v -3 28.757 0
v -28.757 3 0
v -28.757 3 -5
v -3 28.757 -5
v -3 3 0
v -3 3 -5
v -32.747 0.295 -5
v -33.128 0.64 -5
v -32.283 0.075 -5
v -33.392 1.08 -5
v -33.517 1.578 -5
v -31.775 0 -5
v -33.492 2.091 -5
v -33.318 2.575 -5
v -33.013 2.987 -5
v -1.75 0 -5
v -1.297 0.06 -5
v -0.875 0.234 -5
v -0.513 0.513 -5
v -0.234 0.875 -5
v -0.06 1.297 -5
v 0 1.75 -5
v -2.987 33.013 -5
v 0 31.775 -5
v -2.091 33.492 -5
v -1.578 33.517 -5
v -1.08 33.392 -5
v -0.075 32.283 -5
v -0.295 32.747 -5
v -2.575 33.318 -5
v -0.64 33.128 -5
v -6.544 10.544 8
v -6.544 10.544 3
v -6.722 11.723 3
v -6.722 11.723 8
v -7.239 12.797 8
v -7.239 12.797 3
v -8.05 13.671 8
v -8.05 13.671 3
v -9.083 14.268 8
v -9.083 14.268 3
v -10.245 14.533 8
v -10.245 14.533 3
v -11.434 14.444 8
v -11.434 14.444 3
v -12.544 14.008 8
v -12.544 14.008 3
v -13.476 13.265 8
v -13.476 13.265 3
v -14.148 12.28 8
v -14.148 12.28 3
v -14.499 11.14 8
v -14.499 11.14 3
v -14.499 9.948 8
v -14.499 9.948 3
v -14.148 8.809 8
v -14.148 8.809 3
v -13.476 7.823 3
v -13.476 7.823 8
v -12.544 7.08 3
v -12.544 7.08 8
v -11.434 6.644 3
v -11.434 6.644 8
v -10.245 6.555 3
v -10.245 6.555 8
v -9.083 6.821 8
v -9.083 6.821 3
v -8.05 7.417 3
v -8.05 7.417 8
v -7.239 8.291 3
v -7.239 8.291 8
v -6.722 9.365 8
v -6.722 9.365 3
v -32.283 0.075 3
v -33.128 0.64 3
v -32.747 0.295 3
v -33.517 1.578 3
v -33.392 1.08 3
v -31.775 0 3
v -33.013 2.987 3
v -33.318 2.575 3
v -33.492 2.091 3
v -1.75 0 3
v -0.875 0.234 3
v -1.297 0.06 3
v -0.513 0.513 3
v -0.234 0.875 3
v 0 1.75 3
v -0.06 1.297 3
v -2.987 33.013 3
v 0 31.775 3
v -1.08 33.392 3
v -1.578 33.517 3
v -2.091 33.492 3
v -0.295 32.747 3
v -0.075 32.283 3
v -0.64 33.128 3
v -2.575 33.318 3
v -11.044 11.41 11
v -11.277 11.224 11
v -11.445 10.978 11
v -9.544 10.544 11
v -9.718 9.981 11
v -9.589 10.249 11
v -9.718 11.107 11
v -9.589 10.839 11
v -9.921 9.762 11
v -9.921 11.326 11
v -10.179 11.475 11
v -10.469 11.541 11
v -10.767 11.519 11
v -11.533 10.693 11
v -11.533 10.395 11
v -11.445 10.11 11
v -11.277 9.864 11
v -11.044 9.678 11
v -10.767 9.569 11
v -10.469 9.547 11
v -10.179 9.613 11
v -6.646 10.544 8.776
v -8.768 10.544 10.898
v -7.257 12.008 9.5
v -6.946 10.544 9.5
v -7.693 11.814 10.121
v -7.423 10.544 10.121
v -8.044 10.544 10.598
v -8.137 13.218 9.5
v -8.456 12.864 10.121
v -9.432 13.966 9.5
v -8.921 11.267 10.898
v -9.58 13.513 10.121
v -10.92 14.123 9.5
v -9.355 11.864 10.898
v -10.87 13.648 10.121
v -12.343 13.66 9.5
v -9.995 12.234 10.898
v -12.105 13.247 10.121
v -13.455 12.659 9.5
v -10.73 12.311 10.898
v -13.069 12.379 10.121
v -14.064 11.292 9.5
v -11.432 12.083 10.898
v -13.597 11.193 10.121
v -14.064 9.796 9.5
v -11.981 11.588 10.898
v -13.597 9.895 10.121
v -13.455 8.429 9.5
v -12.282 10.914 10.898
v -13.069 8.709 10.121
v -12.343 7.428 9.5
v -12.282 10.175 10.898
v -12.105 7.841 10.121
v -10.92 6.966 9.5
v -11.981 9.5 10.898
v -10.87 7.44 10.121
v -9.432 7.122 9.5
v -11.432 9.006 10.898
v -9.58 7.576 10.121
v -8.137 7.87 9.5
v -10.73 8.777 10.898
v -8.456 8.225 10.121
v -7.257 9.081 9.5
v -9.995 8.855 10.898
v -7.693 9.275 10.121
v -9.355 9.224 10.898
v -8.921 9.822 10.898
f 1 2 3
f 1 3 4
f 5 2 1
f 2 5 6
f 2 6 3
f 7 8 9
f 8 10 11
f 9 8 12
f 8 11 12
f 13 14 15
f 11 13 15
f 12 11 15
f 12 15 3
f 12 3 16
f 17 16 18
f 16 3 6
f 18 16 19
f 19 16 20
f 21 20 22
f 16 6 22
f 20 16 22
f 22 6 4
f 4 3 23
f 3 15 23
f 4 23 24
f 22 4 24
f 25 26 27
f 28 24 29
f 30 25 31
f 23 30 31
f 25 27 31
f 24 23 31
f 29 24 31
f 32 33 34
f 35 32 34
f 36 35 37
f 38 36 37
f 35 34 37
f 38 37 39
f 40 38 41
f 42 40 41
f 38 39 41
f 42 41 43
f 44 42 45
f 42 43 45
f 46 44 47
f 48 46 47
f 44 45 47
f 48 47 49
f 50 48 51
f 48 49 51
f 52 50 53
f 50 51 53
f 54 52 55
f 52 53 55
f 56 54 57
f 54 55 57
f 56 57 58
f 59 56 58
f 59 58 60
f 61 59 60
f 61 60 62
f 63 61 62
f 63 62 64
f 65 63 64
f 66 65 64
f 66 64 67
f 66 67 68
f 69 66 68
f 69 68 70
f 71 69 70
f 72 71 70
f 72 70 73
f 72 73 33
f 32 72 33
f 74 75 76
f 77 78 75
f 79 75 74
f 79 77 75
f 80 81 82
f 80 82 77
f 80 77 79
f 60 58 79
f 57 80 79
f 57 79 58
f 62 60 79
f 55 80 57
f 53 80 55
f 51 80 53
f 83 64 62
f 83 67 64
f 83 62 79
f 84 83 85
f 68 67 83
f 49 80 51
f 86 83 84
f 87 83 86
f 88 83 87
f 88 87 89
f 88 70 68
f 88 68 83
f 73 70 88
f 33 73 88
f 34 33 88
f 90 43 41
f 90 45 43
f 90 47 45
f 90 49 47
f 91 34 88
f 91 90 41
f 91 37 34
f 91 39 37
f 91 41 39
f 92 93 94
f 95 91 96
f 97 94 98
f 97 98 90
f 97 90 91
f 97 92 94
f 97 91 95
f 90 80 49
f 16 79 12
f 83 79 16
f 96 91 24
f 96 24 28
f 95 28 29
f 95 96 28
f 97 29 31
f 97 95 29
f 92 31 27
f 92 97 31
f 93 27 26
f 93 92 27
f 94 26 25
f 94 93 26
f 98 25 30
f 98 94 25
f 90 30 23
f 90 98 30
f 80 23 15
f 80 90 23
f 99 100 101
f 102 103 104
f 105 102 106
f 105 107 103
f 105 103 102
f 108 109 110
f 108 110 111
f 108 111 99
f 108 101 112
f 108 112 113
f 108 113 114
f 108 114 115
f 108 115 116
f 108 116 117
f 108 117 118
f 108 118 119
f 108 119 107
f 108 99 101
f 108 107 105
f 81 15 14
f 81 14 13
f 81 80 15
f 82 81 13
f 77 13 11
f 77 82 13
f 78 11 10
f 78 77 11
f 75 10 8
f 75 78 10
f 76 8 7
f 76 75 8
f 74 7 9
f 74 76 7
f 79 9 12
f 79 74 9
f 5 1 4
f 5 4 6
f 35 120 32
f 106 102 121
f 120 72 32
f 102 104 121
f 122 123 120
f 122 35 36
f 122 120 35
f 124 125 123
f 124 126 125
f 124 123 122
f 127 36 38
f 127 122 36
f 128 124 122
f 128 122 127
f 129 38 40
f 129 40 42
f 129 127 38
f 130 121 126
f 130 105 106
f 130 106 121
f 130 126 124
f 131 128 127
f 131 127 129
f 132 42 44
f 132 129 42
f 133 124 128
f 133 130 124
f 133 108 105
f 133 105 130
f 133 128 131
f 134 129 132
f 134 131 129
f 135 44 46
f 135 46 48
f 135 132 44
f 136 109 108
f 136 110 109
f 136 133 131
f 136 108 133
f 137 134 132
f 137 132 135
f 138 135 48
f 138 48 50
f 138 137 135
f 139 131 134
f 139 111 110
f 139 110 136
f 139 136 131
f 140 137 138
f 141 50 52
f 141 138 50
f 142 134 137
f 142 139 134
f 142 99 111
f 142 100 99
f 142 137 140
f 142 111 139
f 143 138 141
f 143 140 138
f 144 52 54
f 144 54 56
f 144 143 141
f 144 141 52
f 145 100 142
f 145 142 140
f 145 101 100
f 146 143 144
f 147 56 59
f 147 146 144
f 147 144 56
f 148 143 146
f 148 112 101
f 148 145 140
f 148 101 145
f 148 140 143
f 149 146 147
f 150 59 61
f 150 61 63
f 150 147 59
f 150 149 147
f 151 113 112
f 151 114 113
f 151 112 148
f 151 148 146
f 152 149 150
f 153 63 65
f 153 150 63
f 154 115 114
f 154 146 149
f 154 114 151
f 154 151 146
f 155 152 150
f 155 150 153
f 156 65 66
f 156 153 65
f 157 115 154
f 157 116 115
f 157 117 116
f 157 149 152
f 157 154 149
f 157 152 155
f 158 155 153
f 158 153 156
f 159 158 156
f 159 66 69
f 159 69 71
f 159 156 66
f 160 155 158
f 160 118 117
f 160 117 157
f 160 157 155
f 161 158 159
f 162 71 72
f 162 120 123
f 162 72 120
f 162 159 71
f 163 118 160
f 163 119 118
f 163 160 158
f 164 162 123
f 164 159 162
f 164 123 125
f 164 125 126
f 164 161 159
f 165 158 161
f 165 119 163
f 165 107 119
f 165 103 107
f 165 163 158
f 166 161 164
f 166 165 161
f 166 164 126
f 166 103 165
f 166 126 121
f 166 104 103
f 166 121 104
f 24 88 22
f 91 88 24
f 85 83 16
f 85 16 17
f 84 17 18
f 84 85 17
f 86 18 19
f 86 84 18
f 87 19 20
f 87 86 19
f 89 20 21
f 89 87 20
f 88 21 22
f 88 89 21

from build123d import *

# Parameters (mm, degrees)
F0_R     = 4
F1_DEPTH = 11
F2_DEPTH = 3
F3_DEPTH = 5
F4_R     = 3


# Not quite as in the source:
# - a feature names something its author has since deleted; it is built from what else it names


with BuildPart() as f1:
    # F0 (on Top) → F1 (new body)
    with BuildSketch(Plane.XY):
        with Locations((-10.5441558773, 10.5441558773)):
            Circle(F0_R)
    extrude(amount=F1_DEPTH)

    # F0 (on Top) → F2 (join)
    with BuildSketch(Plane.XY):
        with BuildLine():
            ThreePointArc((-30.0251262658, 1.75), (-30.5376893988, 0.5125631329), (-31.7751262658, 0))
            Line((-31.7751262658, 0), (-1.7499999988, 0))
            ThreePointArc((-1.7499999988, 0), (-2.9874368675, 2.9874368666), (0, 1.75))
            Line((0, 1.75), (0, 31.7751262658))
            ThreePointArc((0, 31.7751262658), (-2.4196959983, 30.1583370805), (-2.9874368799, 33.0125631201))
            Line((-2.9874368799, 33.0125631201), (-33.0125631516, 2.9874368484))
            ThreePointArc((-33.0125631516, 2.9874368484), (-31.1054302714, 3.3667891869), (-30.0251262658, 1.75))
        make_face()
        Polygon((-3, 3), (-28.7573593129, 3), (-3, 28.7573593129), align=None, mode=Mode.SUBTRACT)
        Polygon((-3, 28.7573593129), (-28.7573593129, 3), (-3, 3), align=None)
        with Locations((-10.5441558773, 10.5441558773)):
            Circle(F0_R, mode=Mode.SUBTRACT)
        with BuildLine():
            ThreePointArc((-33.0125631516, 2.9874368484), (-33.3919154427, 1.0803039812), (-31.7751262658, 0))
            ThreePointArc((-31.7751262658, 0), (-30.5376893988, 0.5125631329), (-30.0251262658, 1.75))
            ThreePointArc((-30.0251262658, 1.75), (-31.1054302714, 3.3667891869), (-33.0125631516, 2.9874368484))
        make_face()
        with BuildLine():
            ThreePointArc((0, 1.75), (-2.9874368675, 2.9874368666), (-1.7499999988, 0))
            ThreePointArc((-1.7499999988, 0), (-0.5125631325, 0.5125631334), (0, 1.75))
        make_face()
        with BuildLine():
            ThreePointArc((0, 31.7751262658), (-1.0803040017, 33.3919154512), (-2.9874368799, 33.0125631201))
            ThreePointArc((-2.9874368799, 33.0125631201), (-2.4196959983, 30.1583370805), (0, 31.7751262658))
        make_face()
    extrude(amount=F2_DEPTH)

    # F0 (on Top) → F3 (join)
    with BuildSketch(Plane.XY):
        with BuildLine():
            ThreePointArc((-30.0251262658, 1.75), (-30.5376893988, 0.5125631329), (-31.7751262658, 0))
            Line((-31.7751262658, 0), (-1.7499999988, 0))
            ThreePointArc((-1.7499999988, 0), (-2.9874368675, 2.9874368666), (0, 1.75))
            Line((0, 1.75), (0, 31.7751262658))
            ThreePointArc((0, 31.7751262658), (-2.4196959983, 30.1583370805), (-2.9874368799, 33.0125631201))
            Line((-2.9874368799, 33.0125631201), (-33.0125631516, 2.9874368484))
            ThreePointArc((-33.0125631516, 2.9874368484), (-31.1054302714, 3.3667891869), (-30.0251262658, 1.75))
        make_face()
        Polygon((-3, 3), (-28.7573593129, 3), (-3, 28.7573593129), align=None, mode=Mode.SUBTRACT)
        with BuildLine():
            ThreePointArc((0, 1.75), (-2.9874368675, 2.9874368666), (-1.7499999988, 0))
            ThreePointArc((-1.7499999988, 0), (-0.5125631325, 0.5125631334), (0, 1.75))
        make_face()
        with BuildLine():
            ThreePointArc((0, 31.7751262658), (-1.0803040017, 33.3919154512), (-2.9874368799, 33.0125631201))
            ThreePointArc((-2.9874368799, 33.0125631201), (-2.4196959983, 30.1583370805), (0, 31.7751262658))
        make_face()
        with BuildLine():
            ThreePointArc((-33.0125631516, 2.9874368484), (-33.3919154427, 1.0803039812), (-31.7751262658, 0))
            ThreePointArc((-31.7751262658, 0), (-30.5376893988, 0.5125631329), (-30.0251262658, 1.75))
            ThreePointArc((-30.0251262658, 1.75), (-31.1054302714, 3.3667891869), (-33.0125631516, 2.9874368484))
        make_face()
    extrude(amount=-F3_DEPTH)

    # F4
    f4_edges = [f1.edges().sort_by_distance(p)[0] for p in [
        (-14.544156, 10.544156, 11),
    ]]
    fillet(f4_edges, radius=F4_R)


solid = f1.part
